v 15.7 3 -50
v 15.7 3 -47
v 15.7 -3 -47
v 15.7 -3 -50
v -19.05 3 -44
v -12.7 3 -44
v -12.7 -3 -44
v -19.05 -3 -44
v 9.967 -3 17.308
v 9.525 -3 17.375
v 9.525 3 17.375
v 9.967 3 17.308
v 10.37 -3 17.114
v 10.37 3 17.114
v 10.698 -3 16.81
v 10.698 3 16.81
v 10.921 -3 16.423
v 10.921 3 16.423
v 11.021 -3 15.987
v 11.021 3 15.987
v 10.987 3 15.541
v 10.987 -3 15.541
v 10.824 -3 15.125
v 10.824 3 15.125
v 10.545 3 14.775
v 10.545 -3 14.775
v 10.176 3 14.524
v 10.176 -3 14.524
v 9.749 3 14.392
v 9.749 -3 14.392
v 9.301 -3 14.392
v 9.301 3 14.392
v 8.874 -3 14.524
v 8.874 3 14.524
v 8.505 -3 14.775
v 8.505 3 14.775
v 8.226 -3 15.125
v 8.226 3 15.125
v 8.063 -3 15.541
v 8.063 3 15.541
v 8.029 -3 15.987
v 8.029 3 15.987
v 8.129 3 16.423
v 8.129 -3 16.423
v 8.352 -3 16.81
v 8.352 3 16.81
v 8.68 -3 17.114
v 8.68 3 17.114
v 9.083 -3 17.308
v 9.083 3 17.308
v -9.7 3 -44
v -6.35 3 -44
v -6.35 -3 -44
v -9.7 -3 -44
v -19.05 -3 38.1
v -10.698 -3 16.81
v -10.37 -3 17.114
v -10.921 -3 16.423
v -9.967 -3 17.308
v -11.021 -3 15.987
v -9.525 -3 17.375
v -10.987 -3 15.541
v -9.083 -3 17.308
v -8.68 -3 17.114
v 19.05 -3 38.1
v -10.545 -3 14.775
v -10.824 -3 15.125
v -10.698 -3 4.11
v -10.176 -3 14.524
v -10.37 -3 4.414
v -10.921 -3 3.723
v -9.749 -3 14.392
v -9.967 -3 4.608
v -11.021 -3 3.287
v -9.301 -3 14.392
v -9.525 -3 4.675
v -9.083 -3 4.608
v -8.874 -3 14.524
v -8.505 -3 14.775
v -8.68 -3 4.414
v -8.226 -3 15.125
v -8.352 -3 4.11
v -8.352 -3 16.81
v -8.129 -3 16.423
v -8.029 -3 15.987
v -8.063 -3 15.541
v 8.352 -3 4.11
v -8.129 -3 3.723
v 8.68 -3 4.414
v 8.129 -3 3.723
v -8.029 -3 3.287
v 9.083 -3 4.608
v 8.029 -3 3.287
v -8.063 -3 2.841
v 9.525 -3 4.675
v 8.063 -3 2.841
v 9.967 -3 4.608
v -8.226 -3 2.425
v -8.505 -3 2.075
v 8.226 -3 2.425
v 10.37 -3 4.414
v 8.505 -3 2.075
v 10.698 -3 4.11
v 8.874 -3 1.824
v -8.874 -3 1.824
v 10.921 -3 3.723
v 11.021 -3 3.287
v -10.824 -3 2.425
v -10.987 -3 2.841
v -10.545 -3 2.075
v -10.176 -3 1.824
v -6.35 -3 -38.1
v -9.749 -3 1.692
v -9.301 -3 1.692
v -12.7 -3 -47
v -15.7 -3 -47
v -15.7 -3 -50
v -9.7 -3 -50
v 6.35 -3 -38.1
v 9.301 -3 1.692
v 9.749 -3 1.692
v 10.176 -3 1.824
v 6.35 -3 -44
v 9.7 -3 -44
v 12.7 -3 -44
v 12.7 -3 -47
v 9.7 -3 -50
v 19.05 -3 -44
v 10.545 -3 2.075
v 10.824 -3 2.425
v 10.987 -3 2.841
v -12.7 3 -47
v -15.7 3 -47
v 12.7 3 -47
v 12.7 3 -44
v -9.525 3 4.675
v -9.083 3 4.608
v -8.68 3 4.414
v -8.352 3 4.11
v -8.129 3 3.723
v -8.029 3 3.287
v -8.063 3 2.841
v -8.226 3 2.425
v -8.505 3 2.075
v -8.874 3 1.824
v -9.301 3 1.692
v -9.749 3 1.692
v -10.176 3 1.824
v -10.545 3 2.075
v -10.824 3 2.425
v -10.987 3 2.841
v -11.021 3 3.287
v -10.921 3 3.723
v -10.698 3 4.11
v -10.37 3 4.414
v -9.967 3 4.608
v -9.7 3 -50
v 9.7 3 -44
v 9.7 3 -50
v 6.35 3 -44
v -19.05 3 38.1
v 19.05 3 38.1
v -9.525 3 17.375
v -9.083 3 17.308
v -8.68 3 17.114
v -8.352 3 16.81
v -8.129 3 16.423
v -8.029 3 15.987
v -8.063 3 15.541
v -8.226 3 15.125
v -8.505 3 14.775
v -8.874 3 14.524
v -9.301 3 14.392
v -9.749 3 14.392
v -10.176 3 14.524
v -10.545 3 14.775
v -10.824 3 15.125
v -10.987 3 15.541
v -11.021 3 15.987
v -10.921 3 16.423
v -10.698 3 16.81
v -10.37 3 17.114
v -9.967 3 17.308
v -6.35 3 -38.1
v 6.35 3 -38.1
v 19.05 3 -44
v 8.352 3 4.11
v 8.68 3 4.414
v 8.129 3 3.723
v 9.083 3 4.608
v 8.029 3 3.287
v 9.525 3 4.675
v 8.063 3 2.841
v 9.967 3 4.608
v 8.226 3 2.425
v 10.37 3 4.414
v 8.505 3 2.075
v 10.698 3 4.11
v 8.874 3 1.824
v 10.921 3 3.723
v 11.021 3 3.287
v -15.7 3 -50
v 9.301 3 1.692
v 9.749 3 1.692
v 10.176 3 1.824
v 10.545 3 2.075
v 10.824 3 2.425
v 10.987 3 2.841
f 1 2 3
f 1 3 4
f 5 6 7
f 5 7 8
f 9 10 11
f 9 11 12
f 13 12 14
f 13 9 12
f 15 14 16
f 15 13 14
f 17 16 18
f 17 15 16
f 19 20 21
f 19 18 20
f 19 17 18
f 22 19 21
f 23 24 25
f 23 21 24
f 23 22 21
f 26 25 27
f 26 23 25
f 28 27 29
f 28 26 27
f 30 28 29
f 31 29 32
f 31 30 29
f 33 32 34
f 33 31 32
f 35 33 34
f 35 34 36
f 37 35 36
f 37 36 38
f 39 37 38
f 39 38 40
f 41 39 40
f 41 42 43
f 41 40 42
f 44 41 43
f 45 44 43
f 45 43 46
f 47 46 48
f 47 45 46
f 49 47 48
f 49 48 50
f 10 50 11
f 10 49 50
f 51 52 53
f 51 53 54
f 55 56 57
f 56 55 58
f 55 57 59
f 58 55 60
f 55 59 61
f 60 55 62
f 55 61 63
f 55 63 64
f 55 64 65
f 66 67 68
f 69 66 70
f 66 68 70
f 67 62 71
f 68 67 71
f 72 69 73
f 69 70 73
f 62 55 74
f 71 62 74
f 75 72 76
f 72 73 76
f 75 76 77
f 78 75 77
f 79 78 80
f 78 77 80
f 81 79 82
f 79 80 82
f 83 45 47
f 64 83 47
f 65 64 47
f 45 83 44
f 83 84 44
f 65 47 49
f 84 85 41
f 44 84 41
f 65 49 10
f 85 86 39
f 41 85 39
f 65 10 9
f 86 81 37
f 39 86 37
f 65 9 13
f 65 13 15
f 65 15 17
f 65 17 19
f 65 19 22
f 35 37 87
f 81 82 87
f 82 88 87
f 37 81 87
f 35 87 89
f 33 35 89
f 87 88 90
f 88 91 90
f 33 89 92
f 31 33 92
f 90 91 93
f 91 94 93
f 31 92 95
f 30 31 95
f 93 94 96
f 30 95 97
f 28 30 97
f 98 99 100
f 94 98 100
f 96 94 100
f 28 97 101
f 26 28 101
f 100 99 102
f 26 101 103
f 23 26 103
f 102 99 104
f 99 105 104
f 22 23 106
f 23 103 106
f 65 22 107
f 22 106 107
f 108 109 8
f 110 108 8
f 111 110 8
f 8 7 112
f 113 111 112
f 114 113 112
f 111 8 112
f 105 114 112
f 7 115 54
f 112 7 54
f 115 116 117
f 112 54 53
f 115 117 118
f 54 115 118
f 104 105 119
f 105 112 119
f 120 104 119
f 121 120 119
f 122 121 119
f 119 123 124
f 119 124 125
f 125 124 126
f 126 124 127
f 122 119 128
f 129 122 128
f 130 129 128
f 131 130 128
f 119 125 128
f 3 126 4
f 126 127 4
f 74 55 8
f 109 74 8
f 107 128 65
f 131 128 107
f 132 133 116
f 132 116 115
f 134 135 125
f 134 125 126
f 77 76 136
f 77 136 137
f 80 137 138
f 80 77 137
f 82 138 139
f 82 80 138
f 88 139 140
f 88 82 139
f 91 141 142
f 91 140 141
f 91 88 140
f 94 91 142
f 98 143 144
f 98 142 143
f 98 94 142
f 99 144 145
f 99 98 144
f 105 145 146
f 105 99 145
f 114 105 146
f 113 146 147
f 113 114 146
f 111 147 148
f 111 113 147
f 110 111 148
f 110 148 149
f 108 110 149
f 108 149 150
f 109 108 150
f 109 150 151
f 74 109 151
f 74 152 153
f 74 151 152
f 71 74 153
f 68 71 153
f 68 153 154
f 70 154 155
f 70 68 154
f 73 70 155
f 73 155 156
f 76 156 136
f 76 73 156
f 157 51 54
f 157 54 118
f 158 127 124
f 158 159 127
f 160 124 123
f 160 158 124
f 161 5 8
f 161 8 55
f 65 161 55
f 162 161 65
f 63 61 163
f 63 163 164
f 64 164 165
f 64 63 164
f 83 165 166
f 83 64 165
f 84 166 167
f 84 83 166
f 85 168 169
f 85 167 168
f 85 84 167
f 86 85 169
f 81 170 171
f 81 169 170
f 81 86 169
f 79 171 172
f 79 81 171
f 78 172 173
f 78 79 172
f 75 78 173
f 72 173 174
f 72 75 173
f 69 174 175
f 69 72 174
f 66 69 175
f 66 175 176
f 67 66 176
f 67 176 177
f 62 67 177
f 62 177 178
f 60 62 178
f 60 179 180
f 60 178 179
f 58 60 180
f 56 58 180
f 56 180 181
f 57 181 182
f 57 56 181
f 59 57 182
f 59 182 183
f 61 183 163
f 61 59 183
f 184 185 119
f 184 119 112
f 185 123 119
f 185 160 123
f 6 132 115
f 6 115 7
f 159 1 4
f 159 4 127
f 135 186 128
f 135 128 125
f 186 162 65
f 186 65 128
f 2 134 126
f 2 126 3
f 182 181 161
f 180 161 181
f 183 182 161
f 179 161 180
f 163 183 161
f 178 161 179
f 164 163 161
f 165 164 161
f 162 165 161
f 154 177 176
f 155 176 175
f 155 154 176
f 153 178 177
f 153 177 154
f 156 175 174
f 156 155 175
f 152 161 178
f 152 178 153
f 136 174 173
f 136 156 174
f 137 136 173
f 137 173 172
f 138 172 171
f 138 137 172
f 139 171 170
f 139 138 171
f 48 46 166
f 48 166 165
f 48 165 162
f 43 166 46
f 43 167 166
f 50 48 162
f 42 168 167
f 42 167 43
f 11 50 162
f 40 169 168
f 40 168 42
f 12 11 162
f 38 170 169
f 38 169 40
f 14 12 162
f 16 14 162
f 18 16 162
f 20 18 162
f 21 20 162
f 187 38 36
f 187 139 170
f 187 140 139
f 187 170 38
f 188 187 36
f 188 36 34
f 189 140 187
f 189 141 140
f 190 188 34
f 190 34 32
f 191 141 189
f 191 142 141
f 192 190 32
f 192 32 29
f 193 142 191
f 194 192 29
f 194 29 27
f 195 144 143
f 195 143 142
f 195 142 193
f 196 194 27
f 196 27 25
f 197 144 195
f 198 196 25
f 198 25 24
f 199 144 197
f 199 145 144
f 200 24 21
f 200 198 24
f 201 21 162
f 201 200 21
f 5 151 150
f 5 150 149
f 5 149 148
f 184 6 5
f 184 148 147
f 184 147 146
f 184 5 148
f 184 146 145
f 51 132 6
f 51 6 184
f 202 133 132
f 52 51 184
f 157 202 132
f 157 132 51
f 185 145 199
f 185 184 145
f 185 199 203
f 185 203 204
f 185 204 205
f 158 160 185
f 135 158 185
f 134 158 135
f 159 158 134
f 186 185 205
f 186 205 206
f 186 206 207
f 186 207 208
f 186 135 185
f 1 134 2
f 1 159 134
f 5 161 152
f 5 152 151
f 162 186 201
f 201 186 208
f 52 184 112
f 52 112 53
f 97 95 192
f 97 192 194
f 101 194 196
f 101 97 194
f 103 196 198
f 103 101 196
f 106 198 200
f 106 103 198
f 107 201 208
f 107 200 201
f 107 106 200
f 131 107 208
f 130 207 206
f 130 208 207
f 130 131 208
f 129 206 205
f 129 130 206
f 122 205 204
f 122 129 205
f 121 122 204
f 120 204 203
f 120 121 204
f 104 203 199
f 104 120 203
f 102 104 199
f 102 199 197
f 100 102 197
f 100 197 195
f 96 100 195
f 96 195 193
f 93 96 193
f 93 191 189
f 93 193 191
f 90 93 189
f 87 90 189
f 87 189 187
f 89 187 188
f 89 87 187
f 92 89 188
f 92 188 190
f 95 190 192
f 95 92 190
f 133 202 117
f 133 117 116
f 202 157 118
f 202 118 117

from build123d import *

# Parameters (mm, degrees)
BOSS_EXTRUDE1_DEPTH     = 2.999999969
CUT_EXTRUDE1_DEPTH      = 54.841456961
CUT_EXTRUDE1_DEPTH_BACK = 54.841456961
SKETCH2_R               = 1.5


with BuildPart() as part:
    # Sketch1 → Boss-Extrude1 (new, symmetric)
    with BuildSketch(Plane(origin=(0, 0, 0), x_dir=(1, 0, 0), z_dir=(0, 1, 0))):
        Polygon((15.7, 43.999999884), (12.7, 43.999999884), (9.7, 43.999999884), (6.35, 43.999999884), (6.35, 38.1), (-6.35, 38.1), (-6.35, 43.999999884), (-9.7, 43.999999884), (-12.7, 43.999999884), (-15.7, 43.999999884), (-19.05, 43.999999884), (-19.05, 38.1), (-19.05, -38.1), (19.05, -38.1), (19.05, 38.1), (19.05, 43.999999884), align=None)
        Polygon((-12.7, 43.999999884), (-9.7, 43.999999884), (-9.7, 49.999999884), (-15.7, 49.999999884), (-15.7, 46.999999884), (-12.7, 46.999999884), align=None)
        Polygon((9.7, 43.999999884), (12.7, 43.999999884), (12.7, 46.999999884), (15.7, 46.999999884), (15.7, 49.999999884), (9.7, 49.999999884), align=None)
    extrude(amount=BOSS_EXTRUDE1_DEPTH, both=True)

    # Sketch2 → Cut-Extrude1 (cut, two sides: drawn at the far end of the back side and taken through both)
    with BuildSketch(Plane(origin=(0, 2.999999969, 0), x_dir=(1, 0, 0), z_dir=(0, 1, 0)).offset(-CUT_EXTRUDE1_DEPTH_BACK)):
        with Locations(Location((-9.525, -3.175, 0), (0, 0, 270))):
            Circle(SKETCH2_R)
        with Locations(Location((9.525, -3.175, 0), (0, 0, 270))):
            Circle(SKETCH2_R)
        with Locations(Location((9.525, -15.875, 0), (0, 0, 270))):
            Circle(SKETCH2_R)
        with Locations(Location((-9.525, -15.875, 0), (0, 0, 270))):
            Circle(SKETCH2_R)
    extrude(amount=CUT_EXTRUDE1_DEPTH + CUT_EXTRUDE1_DEPTH_BACK, mode=Mode.SUBTRACT)


solid = part.part
